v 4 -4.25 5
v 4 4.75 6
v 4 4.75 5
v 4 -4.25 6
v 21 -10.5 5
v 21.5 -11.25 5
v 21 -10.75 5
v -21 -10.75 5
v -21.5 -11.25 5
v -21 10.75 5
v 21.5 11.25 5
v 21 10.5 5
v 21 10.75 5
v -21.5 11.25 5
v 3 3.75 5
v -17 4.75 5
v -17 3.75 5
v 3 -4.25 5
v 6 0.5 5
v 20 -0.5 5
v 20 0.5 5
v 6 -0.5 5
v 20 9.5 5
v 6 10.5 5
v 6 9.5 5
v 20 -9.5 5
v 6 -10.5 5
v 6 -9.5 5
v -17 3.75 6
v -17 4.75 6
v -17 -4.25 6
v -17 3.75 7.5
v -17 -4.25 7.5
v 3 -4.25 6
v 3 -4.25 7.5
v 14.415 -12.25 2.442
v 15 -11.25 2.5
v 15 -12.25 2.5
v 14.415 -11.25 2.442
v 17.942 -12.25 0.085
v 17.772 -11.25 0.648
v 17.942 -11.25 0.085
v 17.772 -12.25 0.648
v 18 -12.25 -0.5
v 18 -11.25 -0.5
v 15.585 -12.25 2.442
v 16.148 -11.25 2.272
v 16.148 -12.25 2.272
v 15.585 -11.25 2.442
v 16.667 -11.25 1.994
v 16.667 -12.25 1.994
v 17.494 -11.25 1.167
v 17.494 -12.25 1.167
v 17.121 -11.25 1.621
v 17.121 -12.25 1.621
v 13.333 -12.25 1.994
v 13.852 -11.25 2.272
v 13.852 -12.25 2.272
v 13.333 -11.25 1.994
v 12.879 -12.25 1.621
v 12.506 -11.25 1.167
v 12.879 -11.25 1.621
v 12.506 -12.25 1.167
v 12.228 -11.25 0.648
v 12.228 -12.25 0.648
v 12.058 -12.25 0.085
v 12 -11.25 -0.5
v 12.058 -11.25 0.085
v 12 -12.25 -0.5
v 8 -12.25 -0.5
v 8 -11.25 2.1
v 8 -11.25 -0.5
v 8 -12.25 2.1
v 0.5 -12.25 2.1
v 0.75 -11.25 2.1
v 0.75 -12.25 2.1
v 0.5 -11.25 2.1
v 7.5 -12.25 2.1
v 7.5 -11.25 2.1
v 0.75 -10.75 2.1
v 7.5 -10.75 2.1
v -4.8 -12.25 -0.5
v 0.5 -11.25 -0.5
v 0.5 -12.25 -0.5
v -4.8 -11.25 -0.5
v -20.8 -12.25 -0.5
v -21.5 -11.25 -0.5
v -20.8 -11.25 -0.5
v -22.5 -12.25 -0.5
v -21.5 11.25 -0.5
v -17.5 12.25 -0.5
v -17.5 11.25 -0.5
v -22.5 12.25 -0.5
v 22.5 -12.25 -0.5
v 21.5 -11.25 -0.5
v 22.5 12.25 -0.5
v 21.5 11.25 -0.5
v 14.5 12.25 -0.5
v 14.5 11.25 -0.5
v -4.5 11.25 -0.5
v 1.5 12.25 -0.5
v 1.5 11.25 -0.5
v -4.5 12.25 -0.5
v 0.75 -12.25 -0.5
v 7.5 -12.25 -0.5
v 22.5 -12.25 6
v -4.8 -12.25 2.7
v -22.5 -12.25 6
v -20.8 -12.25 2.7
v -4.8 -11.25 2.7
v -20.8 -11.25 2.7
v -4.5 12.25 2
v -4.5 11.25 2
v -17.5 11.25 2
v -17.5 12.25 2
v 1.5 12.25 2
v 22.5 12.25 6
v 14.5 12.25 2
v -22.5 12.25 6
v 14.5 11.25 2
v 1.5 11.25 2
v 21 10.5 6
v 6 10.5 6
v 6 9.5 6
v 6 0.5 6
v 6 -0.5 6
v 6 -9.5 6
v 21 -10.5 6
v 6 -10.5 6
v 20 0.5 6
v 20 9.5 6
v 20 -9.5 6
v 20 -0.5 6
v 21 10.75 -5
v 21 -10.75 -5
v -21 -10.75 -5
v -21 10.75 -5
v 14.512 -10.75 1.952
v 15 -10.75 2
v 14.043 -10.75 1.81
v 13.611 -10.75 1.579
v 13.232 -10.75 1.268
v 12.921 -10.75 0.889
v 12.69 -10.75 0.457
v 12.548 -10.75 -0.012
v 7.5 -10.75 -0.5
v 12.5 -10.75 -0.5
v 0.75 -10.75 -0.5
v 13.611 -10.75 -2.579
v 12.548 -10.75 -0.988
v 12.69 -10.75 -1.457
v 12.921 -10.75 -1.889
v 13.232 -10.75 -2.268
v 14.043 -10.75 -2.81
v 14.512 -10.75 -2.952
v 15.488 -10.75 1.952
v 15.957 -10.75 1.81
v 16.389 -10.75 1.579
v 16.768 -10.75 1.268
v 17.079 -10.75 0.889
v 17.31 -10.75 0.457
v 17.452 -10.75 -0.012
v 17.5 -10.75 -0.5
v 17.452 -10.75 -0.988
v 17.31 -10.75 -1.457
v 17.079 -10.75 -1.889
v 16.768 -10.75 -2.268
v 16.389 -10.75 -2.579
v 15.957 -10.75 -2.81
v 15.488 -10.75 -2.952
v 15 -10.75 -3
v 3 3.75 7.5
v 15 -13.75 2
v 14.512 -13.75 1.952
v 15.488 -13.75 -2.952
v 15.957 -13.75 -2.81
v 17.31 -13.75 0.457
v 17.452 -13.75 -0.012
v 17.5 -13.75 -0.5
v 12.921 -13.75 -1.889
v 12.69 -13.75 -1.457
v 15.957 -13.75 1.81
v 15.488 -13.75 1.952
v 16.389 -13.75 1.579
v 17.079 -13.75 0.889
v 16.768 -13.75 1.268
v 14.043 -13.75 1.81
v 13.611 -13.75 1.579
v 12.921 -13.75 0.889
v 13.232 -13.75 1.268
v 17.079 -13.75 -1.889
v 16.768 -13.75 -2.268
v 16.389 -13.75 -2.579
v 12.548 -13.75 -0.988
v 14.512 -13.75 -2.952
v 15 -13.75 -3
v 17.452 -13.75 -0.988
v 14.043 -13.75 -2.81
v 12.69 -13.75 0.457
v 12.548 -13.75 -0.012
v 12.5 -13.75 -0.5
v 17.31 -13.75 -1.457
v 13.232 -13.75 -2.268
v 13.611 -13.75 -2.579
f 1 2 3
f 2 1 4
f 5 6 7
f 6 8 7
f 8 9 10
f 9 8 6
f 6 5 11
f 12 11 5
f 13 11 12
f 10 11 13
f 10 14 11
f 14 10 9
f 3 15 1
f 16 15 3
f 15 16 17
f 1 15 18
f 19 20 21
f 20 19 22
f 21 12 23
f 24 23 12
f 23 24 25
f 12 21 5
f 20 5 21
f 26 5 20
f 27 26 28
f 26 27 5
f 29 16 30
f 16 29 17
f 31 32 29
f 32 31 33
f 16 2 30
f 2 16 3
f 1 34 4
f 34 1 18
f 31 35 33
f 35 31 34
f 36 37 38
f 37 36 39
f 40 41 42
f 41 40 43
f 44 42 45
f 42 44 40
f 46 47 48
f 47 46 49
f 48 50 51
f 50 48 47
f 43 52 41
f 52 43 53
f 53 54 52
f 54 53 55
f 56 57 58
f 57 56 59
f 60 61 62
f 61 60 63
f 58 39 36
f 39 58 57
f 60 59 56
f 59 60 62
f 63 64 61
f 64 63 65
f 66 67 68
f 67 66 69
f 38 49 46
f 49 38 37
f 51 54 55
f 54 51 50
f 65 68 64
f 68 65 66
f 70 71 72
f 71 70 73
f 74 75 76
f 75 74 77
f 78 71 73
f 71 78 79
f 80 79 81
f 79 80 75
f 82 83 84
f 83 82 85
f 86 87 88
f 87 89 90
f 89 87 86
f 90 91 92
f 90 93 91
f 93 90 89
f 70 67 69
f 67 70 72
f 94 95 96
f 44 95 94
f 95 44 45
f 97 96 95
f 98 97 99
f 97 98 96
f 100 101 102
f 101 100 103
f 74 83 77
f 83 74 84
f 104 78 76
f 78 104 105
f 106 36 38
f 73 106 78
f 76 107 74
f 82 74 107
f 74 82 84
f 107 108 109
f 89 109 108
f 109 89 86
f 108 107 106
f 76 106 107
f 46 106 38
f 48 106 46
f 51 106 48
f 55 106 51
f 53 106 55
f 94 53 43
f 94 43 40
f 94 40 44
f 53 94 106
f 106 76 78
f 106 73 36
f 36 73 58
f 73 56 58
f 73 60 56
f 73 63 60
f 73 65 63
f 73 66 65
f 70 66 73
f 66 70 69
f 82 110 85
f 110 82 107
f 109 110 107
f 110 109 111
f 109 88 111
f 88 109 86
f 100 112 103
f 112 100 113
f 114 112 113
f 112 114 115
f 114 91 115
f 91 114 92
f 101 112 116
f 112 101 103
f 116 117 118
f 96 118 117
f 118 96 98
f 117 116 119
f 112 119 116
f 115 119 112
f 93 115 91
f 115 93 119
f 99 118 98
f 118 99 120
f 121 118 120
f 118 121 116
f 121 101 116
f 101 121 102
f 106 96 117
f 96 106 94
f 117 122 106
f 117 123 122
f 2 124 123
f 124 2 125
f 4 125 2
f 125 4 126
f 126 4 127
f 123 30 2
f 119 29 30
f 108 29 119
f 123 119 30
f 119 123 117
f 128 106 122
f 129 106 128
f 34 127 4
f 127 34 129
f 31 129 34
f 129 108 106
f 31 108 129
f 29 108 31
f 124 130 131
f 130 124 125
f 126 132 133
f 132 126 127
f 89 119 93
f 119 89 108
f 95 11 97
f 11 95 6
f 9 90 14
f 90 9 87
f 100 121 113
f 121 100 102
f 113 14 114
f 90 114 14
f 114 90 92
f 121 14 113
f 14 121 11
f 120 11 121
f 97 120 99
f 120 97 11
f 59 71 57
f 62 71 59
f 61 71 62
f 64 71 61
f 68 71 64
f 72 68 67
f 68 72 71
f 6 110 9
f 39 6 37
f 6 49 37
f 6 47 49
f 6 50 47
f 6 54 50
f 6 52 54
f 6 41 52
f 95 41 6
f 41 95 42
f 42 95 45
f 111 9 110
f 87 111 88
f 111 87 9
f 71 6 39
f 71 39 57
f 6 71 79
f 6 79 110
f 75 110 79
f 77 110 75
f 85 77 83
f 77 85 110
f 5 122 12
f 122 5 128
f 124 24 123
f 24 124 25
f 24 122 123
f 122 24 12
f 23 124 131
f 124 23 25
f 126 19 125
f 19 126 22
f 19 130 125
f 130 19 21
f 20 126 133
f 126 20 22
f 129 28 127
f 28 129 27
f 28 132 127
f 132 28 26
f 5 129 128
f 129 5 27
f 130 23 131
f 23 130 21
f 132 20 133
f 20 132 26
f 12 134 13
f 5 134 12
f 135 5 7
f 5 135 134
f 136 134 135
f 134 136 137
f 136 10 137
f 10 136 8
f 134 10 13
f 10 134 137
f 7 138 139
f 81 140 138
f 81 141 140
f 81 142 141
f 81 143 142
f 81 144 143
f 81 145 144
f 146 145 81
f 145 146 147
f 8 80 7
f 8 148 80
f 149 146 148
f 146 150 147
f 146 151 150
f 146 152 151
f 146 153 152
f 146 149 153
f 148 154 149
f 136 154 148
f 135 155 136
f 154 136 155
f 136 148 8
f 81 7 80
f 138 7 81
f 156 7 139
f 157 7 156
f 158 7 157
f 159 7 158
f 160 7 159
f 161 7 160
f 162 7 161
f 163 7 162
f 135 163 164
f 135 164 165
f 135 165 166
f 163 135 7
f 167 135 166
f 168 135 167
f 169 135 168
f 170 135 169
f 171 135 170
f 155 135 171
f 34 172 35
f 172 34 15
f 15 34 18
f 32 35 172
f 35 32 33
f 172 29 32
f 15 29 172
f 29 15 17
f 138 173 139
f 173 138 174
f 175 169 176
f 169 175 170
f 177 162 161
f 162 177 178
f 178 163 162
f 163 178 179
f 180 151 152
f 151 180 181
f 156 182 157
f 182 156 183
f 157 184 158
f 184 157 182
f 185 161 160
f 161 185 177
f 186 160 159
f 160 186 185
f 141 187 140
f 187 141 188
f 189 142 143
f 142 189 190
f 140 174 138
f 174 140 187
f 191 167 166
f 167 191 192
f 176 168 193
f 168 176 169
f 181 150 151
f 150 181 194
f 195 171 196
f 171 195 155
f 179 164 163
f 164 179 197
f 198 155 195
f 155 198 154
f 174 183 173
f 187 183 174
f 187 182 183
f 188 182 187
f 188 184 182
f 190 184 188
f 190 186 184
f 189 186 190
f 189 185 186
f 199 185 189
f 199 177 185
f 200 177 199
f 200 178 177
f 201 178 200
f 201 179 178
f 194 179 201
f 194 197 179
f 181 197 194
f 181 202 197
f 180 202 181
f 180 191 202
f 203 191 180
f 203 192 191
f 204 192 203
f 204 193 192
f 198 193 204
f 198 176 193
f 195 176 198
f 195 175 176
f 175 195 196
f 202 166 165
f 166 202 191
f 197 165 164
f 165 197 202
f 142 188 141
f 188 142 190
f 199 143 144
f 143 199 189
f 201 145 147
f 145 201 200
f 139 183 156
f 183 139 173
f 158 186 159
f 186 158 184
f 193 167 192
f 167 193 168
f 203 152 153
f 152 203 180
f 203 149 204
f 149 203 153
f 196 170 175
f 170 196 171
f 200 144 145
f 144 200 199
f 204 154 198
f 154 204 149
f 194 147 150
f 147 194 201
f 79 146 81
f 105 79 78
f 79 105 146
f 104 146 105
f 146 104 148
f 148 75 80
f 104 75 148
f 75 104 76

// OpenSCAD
pcbwidth=42;
pcbdepth=21.5;
pcbheight=10;
wallth=1;

module pcb() {
    translate([-pcbwidth/2,-pcbdepth/2,-pcbheight/2]) {
        cube([pcbwidth,pcbdepth,pcbheight], center=false);
        translate([4,6.5,pcbheight])
            cube([20,8,2.5], center=false);
        translate([36,2,pcbheight-1.5])
            cube([4,3,2], center=false);
        translate([36,16,pcbheight-1.5])
            cube([4,3,2], center=false);
        
        translate([36,-1.5,4.5])
            rotate([90,0,0])
                cylinder(d=5, h=3, $fn=32, center=true);
        
        translate([21.75,-1.5,4.5])
            cube([6.75,3,2.6], center=false);
        
    }
}

module topcase() {
    intersection() {
    
    difference() {
        translate([0,0,0])
            cube([pcbwidth+2*wallth+1,pcbdepth+2*wallth+1,pcbheight+2*wallth], center=true);
        translate([0,0,-wallth])
            cube([pcbwidth+1,pcbdepth+1,pcbheight+2*wallth], center=true);
        
        translate([-pcbwidth/2,-pcbdepth/2,-pcbheight/2]) {
            translate([4,6.5,pcbheight])
                cube([21,9,2.5], center=false);
            
            translate([36,-1.5,4.5])
                rotate([90,0,0])
                    cylinder(d=6, h=3, $fn=32, center=true);
            
            translate([21.5,-1.5,4.5])
                cube([7.5,3,2.6], center=false);
            translate([21.5-15.3-6,-1.5,4.5])
                cube([16,3,3.2], center=false);
            
            translate([3.5,pcbdepth-1.5,4.5-3.5])
                cube([13,3,6], center=false);
            translate([3.5+13+6,pcbdepth-1.5,4.5-3.5])
                cube([13,3,6], center=false);
        }
        
        translate([6,9.5,0])
            cube([15,1,20]);
        translate([6,-0.5,0])
            cube([15,1,20]);
        translate([6,-9.5-1,0])
            cube([15,1,20]);
        translate([20,-9.5-1,0])
            cube([1,20,20]);
    }
    
    
        translate([0,0,5.5])
            cube([pcbwidth+2*wallth+1,pcbdepth+2*wallth+1,pcbheight+2*wallth], center=true);
    }
}
topcase();

color("blue", alpha=0.5)
    pcb();
